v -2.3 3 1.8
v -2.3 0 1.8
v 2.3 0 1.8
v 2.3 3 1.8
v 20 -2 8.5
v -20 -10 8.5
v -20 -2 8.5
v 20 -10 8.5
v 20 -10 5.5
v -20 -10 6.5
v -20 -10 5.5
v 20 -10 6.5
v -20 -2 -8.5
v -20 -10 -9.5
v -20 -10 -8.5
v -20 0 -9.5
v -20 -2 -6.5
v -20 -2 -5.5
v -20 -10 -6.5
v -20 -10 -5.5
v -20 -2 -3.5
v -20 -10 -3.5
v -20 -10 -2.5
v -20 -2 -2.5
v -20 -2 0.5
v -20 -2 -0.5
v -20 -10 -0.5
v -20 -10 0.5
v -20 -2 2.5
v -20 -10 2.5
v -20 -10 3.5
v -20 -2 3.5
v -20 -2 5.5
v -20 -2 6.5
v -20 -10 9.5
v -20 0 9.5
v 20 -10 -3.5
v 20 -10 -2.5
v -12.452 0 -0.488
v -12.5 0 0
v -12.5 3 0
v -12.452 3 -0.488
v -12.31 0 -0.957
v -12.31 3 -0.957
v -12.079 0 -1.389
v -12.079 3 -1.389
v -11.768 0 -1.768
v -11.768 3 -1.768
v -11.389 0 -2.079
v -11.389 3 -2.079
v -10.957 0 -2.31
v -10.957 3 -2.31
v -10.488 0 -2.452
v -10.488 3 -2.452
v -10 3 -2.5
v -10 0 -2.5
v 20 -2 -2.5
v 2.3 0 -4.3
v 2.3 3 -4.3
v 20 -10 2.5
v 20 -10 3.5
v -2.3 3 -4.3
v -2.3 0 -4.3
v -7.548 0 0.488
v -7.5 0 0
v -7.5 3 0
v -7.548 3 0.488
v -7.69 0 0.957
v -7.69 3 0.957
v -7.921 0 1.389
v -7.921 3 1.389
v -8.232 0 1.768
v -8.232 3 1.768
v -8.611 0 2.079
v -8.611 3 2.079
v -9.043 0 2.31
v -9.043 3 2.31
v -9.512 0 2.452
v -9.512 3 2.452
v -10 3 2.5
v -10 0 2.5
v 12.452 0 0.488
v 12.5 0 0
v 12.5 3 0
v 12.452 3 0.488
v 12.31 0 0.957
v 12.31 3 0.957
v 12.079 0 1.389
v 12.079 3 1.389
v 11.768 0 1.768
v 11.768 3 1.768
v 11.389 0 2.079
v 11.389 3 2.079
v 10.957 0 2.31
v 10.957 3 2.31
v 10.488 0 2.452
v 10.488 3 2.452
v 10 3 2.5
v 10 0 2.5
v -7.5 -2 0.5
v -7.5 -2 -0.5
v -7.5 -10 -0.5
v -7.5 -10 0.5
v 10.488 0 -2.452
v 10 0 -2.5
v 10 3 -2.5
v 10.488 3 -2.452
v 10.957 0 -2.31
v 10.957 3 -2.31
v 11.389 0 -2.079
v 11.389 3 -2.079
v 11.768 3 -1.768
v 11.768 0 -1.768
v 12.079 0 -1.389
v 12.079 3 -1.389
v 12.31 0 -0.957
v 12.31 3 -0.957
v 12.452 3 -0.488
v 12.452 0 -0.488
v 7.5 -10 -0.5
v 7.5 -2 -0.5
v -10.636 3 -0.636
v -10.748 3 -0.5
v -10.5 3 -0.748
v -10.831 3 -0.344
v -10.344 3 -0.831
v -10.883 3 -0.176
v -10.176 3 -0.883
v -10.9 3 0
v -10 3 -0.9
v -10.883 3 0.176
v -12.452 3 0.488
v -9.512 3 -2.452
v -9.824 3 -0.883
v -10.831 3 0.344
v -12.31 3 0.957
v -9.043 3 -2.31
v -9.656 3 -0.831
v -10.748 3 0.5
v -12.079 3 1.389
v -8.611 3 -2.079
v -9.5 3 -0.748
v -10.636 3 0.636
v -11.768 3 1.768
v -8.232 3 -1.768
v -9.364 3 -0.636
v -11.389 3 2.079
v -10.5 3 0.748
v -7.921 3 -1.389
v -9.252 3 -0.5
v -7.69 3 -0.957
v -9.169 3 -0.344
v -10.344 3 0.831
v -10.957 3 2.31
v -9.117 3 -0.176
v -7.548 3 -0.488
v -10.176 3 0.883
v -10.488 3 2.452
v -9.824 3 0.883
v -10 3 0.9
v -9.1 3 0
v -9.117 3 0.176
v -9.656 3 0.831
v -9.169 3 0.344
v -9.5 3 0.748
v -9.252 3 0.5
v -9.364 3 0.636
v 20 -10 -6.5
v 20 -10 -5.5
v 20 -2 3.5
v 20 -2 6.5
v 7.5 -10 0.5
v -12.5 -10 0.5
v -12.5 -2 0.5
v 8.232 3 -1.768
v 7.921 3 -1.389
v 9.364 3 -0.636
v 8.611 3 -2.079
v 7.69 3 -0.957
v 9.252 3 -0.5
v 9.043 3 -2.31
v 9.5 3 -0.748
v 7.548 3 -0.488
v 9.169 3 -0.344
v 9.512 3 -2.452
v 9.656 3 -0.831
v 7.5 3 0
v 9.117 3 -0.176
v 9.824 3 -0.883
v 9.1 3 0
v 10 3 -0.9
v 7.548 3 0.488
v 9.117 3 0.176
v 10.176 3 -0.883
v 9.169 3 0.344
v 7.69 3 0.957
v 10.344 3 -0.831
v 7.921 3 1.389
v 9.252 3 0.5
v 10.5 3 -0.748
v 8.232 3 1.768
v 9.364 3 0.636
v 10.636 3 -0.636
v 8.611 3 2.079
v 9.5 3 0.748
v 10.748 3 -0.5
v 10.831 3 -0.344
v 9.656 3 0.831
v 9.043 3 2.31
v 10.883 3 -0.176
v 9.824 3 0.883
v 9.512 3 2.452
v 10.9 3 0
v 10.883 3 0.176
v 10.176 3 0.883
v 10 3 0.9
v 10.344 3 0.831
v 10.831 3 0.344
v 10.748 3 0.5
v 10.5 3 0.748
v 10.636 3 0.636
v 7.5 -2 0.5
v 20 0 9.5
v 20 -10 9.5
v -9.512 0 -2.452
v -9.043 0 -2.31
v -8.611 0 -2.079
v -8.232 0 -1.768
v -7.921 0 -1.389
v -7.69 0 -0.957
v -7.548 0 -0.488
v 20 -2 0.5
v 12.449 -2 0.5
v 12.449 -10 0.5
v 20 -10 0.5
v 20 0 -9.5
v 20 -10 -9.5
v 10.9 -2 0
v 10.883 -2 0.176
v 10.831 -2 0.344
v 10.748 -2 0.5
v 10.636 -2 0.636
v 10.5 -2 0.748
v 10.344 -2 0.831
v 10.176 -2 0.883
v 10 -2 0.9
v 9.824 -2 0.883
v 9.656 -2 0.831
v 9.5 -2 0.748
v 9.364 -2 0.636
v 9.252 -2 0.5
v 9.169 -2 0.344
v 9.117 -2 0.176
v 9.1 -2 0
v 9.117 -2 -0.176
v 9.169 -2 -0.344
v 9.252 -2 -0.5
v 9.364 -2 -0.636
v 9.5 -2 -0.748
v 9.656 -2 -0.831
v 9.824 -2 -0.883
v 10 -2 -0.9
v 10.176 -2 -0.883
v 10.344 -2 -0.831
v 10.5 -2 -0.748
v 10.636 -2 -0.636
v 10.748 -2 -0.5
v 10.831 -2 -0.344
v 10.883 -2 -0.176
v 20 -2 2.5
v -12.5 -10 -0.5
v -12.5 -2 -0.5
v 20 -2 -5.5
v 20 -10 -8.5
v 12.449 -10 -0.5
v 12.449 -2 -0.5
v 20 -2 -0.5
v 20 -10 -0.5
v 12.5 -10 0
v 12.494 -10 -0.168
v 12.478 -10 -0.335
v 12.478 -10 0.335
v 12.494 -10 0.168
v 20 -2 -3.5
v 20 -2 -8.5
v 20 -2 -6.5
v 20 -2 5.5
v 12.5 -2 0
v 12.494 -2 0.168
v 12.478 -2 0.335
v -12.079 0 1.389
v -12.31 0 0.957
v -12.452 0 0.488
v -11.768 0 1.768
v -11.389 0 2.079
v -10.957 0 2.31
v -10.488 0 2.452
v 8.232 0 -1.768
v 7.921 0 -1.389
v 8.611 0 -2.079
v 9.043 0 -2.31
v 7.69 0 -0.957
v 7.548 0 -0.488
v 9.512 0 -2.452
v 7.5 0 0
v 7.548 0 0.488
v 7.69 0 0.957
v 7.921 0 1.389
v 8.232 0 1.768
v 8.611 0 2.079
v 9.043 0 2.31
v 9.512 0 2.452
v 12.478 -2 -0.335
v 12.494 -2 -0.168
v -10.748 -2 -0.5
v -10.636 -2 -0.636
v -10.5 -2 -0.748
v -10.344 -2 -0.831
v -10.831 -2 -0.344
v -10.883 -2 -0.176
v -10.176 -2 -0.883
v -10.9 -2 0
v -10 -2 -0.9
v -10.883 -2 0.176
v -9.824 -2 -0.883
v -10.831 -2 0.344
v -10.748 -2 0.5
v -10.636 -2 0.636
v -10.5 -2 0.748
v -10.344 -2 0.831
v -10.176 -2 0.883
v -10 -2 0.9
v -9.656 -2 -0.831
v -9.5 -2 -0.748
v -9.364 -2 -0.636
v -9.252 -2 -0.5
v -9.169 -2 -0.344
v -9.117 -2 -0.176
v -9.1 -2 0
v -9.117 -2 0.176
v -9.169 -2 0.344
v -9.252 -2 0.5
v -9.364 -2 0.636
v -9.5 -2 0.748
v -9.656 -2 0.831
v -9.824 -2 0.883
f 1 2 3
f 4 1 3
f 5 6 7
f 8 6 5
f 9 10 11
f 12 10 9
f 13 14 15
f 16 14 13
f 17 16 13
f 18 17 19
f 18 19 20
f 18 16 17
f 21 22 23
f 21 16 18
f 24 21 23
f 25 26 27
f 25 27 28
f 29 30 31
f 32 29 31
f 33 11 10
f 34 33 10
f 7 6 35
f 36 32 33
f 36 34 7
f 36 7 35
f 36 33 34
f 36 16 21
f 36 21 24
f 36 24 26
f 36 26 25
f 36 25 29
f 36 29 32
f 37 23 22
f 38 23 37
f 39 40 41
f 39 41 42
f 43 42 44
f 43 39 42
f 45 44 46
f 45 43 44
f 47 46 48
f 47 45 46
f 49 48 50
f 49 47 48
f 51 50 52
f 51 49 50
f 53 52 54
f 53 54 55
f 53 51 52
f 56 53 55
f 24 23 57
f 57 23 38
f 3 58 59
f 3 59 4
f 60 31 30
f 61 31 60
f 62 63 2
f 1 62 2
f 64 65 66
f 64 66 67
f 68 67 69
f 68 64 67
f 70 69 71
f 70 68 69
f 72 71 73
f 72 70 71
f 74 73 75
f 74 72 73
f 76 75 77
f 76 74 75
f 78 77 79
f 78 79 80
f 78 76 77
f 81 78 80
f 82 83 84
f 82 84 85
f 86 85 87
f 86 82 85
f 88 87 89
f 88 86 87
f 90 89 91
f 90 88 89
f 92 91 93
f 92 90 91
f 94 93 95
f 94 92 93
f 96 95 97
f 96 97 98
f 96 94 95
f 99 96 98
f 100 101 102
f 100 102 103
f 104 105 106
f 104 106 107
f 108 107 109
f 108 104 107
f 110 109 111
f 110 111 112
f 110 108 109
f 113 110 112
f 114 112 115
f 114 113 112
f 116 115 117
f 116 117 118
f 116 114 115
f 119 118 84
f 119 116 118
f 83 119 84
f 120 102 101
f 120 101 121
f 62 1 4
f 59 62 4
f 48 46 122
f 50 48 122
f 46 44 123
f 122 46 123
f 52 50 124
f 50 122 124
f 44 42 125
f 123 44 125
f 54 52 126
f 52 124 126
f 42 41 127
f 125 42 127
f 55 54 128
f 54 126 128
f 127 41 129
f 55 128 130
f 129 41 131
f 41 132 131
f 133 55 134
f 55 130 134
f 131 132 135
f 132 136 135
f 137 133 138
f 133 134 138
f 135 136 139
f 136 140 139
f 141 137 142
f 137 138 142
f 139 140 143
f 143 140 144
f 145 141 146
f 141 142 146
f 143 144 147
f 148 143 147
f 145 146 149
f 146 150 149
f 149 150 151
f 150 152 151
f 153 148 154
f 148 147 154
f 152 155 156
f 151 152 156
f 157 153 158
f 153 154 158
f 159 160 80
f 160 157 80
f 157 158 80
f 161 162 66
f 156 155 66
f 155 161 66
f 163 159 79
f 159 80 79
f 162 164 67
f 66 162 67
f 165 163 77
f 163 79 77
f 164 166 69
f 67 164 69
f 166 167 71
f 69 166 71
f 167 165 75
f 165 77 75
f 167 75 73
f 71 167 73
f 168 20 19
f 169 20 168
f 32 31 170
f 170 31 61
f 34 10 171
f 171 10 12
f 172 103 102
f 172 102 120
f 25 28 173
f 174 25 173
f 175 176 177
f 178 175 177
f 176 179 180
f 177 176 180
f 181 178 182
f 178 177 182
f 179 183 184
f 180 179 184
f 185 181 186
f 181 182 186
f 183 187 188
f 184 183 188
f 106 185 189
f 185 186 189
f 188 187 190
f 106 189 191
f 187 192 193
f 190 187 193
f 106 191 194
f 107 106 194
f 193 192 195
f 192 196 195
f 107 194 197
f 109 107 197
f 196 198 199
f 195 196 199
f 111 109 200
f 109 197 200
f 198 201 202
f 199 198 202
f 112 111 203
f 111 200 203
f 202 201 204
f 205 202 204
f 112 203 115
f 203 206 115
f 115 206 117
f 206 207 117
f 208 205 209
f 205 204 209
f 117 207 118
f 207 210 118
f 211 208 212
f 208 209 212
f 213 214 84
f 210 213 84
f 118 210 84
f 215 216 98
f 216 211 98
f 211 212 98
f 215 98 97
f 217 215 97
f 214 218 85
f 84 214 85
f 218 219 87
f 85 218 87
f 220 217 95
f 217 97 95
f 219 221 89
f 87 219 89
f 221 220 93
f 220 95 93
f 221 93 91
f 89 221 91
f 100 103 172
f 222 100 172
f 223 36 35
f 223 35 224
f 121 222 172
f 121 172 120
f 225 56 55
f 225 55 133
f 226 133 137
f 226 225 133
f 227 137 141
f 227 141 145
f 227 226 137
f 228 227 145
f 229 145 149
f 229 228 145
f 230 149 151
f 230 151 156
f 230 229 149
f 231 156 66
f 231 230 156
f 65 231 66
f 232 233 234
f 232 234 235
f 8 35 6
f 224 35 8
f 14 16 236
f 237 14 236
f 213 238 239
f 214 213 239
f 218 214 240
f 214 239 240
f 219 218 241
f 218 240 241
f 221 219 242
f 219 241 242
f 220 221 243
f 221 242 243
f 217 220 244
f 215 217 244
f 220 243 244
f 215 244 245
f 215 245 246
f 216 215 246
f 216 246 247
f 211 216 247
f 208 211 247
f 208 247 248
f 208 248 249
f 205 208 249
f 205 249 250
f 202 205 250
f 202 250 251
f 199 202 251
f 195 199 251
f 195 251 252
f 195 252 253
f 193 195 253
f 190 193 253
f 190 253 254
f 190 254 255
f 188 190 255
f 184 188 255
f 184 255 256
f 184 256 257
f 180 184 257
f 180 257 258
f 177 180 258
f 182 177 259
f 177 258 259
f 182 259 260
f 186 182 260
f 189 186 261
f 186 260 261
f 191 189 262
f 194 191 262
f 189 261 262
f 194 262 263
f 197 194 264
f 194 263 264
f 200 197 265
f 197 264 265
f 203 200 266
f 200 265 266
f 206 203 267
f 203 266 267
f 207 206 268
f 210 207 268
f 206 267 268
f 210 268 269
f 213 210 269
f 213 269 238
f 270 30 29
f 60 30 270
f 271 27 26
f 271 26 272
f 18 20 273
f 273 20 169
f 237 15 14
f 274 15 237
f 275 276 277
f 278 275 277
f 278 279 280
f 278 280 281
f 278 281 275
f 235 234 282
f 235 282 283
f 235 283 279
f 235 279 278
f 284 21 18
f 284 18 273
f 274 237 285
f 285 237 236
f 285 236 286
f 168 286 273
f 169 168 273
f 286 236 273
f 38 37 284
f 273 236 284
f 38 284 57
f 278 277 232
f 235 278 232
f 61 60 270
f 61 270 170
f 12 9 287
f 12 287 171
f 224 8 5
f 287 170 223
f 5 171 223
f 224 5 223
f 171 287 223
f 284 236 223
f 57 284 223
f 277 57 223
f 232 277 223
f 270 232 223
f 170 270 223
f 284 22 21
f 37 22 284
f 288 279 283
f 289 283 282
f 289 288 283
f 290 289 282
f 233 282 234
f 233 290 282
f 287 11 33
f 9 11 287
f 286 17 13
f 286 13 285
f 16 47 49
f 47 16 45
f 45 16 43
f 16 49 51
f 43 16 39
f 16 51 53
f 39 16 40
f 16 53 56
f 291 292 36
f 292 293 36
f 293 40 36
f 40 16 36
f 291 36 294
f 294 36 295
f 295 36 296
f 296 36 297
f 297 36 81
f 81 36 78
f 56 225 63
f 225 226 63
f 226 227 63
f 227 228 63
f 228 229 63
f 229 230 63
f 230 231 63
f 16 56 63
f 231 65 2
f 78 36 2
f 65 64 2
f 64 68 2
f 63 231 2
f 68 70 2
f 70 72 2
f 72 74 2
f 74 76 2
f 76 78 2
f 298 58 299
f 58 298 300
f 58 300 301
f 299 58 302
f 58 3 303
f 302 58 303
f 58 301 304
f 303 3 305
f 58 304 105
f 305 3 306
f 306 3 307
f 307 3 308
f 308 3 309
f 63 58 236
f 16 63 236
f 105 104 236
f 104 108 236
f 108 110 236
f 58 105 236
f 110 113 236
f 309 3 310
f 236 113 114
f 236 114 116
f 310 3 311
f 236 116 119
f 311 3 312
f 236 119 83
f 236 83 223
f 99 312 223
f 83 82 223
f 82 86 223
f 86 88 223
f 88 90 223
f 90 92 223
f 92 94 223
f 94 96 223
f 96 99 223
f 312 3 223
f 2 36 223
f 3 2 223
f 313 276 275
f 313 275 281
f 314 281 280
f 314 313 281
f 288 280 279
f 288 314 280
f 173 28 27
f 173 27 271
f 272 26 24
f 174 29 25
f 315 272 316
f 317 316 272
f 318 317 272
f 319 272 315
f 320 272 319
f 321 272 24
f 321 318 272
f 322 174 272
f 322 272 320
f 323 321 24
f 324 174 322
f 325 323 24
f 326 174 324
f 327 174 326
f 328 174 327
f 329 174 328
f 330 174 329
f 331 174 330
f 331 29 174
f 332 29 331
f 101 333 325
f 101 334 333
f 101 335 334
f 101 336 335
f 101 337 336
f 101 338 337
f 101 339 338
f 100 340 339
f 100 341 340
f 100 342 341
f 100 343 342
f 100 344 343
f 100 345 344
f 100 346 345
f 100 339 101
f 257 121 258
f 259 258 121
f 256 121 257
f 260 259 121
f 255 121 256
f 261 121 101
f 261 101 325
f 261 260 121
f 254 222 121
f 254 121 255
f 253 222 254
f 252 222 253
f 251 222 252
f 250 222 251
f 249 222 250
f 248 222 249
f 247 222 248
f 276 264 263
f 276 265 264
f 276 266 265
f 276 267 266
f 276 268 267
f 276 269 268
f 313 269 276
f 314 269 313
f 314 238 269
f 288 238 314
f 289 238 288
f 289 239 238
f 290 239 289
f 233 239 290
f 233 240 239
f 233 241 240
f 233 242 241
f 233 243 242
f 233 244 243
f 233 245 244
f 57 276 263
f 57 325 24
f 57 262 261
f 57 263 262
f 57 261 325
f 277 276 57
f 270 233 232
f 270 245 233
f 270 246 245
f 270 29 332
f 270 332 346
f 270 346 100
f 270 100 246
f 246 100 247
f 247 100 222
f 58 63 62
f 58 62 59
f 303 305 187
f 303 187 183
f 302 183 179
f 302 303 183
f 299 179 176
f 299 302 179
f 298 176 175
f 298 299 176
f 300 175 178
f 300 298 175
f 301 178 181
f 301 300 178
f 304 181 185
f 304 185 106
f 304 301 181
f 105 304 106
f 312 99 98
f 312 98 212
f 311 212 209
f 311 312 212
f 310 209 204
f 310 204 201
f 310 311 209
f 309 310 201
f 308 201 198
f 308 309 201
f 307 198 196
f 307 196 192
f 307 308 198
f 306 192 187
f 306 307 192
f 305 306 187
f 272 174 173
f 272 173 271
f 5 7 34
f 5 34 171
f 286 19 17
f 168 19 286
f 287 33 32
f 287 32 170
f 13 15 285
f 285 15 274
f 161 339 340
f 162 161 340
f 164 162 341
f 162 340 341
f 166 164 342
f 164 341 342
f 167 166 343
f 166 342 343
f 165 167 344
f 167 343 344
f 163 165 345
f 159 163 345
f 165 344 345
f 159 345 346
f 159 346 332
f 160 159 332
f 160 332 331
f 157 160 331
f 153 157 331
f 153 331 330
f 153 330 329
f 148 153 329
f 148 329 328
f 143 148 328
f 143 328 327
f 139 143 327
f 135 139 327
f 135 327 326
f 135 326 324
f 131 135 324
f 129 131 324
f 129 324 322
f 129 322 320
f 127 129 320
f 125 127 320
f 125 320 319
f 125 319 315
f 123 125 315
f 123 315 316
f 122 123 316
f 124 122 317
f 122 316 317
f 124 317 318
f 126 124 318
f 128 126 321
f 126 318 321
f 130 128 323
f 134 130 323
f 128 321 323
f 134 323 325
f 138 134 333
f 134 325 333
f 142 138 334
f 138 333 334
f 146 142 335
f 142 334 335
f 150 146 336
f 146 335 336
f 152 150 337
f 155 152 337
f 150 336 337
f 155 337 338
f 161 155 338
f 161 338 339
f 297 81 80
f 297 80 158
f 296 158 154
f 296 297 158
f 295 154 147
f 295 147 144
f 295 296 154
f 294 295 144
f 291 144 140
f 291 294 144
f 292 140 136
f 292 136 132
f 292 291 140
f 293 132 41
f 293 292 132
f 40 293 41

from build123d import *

# Parameters (mm, degrees)
F0_W     = 40
F0_H     = 19
F1_DEPTH = 10
F2_W     = 40
F2_H     = 2
F4_DEPTH = 8
F5_R     = 0.9
F5_W     = 4.6
F5_H     = 6.1
F7_DEPTH = 5
F8_DEPTH = 8.001
F9_DEPTH = 5.001


# Not quite as in the source:
# - a feature names something its author has since deleted; it is built from what else it names


with BuildPart() as f1:
    # F0 (on Front) → F1 (new body)
    with BuildSketch(Plane.XZ):
        Rectangle(F0_W, F0_H)
    extrude(amount=F1_DEPTH)

    # F2 (on face) → F4 (cut, through all)
    with BuildSketch(Plane.XZ.offset(10)):
        with Locations((0, 7.5)):
            Rectangle(F2_W, F2_H)
        with Locations((0, 4.5)):
            Rectangle(F2_W, F2_H)
        with Locations((0, 1.5)):
            Rectangle(F2_W, F2_H)
        with Locations((0, -1.5)):
            Rectangle(F2_W, F2_H)
        with Locations((0, -4.5)):
            Rectangle(F2_W, F2_H)
        with Locations((0, -7.5)):
            Rectangle(F2_W, F2_H)
    extrude(amount=-F4_DEPTH, mode=Mode.SUBTRACT)

    # F5 (on offset) → F7 (join, through all)
    with BuildSketch(Plane.XZ.offset(2)):
        with BuildLine():
            ThreePointArc((10, 2.5), (8.232233047, 1.767766953), (7.5, 0))
            ThreePointArc((7.5, 0), (8.232233047, -1.767766953), (10, -2.5))
            ThreePointArc((10, -2.5), (11.767766953, -1.767766953), (12.5, 0))
            ThreePointArc((12.5, 0), (11.767766953, 1.767766953), (10, 2.5))
        make_face()
        with Locations((10, 0)):
            Circle(F5_R, mode=Mode.SUBTRACT)
        with BuildLine():
            ThreePointArc((-10, -2.5), (-8.232233047, -1.767766953), (-7.5, 0))
            ThreePointArc((-7.5, 0), (-8.232233047, 1.767766953), (-10, 2.5))
            ThreePointArc((-10, 2.5), (-11.767766953, 1.767766953), (-12.5, 0))
            ThreePointArc((-12.5, 0), (-11.767766953, -1.767766953), (-10, -2.5))
        make_face()
        with Locations((-10, 0)):
            Circle(F5_R, mode=Mode.SUBTRACT)
        with Locations((0, -1.25)):
            Rectangle(F5_W, F5_H)
    extrude(amount=-F7_DEPTH)

    # F5 (on offset) → F8 (cut, through all)
    with BuildSketch(Plane.XZ.offset(2)):
        with BuildLine():
            ThreePointArc((-10, 2.5), (-8.232233047, 1.767766953), (-7.5, 0))
            Line((-7.5, 0), (-7.5, 2.5))
            Line((-7.5, 2.5), (-10, 2.5))
        make_face()
        with BuildLine():
            ThreePointArc((-12.5, 0), (-11.767766953, 1.767766953), (-10, 2.5))
            Line((-10, 2.5), (-12.5, 2.5))
            Line((-12.5, 2.5), (-12.5, 0))
        make_face()
        with BuildLine():
            Line((-12.5, -2.5), (-10, -2.5))
            ThreePointArc((-10, -2.5), (-11.767766953, -1.767766953), (-12.5, 0))
            Line((-12.5, 0), (-12.5, -2.5))
        make_face()
        with BuildLine():
            Line((-7.5, -2.5), (-7.5, 0))
            ThreePointArc((-7.5, 0), (-8.232233047, -1.767766953), (-10, -2.5))
            Line((-10, -2.5), (-7.5, -2.5))
        make_face()
        with BuildLine():
            ThreePointArc((-10, -2.5), (-8.232233047, -1.767766953), (-7.5, 0))
            ThreePointArc((-7.5, 0), (-8.232233047, 1.767766953), (-10, 2.5))
            ThreePointArc((-10, 2.5), (-11.767766953, 1.767766953), (-12.5, 0))
            ThreePointArc((-12.5, 0), (-11.767766953, -1.767766953), (-10, -2.5))
        make_face()
        with Locations((-10, 0)):
            Circle(F5_R, mode=Mode.SUBTRACT)
        with Locations((-10, 0)):
            Circle(F5_R)
        with BuildLine():
            Line((10, 2.5), (7.5, 2.5))
            Line((7.5, 2.5), (7.5, 0))
            ThreePointArc((7.5, 0), (8.232233047, 1.767766953), (10, 2.5))
        make_face()
        with BuildLine():
            ThreePointArc((10, -2.5), (8.232233047, -1.767766953), (7.5, 0))
            Line((7.5, 0), (7.5, -2.5))
            Line((7.5, -2.5), (10, -2.5))
        make_face()
        with BuildLine():
            ThreePointArc((10, 2.5), (8.232233047, 1.767766953), (7.5, 0))
            ThreePointArc((7.5, 0), (8.232233047, -1.767766953), (10, -2.5))
            ThreePointArc((10, -2.5), (11.767766953, -1.767766953), (12.5, 0))
            ThreePointArc((12.5, 0), (11.767766953, 1.767766953), (10, 2.5))
        make_face()
        with Locations((10, 0)):
            Circle(F5_R, mode=Mode.SUBTRACT)
        with Locations((10, 0)):
            Circle(F5_R)
    extrude(amount=F8_DEPTH, mode=Mode.SUBTRACT)

    # F5 (on offset) → F9 (cut, through all)
    with BuildSketch(Plane.XZ.offset(2)):
        with Locations((10, 0)):
            Circle(F5_R)
        with Locations((-10, 0)):
            Circle(F5_R)
    extrude(amount=-F9_DEPTH, mode=Mode.SUBTRACT)


solid = f1.part
